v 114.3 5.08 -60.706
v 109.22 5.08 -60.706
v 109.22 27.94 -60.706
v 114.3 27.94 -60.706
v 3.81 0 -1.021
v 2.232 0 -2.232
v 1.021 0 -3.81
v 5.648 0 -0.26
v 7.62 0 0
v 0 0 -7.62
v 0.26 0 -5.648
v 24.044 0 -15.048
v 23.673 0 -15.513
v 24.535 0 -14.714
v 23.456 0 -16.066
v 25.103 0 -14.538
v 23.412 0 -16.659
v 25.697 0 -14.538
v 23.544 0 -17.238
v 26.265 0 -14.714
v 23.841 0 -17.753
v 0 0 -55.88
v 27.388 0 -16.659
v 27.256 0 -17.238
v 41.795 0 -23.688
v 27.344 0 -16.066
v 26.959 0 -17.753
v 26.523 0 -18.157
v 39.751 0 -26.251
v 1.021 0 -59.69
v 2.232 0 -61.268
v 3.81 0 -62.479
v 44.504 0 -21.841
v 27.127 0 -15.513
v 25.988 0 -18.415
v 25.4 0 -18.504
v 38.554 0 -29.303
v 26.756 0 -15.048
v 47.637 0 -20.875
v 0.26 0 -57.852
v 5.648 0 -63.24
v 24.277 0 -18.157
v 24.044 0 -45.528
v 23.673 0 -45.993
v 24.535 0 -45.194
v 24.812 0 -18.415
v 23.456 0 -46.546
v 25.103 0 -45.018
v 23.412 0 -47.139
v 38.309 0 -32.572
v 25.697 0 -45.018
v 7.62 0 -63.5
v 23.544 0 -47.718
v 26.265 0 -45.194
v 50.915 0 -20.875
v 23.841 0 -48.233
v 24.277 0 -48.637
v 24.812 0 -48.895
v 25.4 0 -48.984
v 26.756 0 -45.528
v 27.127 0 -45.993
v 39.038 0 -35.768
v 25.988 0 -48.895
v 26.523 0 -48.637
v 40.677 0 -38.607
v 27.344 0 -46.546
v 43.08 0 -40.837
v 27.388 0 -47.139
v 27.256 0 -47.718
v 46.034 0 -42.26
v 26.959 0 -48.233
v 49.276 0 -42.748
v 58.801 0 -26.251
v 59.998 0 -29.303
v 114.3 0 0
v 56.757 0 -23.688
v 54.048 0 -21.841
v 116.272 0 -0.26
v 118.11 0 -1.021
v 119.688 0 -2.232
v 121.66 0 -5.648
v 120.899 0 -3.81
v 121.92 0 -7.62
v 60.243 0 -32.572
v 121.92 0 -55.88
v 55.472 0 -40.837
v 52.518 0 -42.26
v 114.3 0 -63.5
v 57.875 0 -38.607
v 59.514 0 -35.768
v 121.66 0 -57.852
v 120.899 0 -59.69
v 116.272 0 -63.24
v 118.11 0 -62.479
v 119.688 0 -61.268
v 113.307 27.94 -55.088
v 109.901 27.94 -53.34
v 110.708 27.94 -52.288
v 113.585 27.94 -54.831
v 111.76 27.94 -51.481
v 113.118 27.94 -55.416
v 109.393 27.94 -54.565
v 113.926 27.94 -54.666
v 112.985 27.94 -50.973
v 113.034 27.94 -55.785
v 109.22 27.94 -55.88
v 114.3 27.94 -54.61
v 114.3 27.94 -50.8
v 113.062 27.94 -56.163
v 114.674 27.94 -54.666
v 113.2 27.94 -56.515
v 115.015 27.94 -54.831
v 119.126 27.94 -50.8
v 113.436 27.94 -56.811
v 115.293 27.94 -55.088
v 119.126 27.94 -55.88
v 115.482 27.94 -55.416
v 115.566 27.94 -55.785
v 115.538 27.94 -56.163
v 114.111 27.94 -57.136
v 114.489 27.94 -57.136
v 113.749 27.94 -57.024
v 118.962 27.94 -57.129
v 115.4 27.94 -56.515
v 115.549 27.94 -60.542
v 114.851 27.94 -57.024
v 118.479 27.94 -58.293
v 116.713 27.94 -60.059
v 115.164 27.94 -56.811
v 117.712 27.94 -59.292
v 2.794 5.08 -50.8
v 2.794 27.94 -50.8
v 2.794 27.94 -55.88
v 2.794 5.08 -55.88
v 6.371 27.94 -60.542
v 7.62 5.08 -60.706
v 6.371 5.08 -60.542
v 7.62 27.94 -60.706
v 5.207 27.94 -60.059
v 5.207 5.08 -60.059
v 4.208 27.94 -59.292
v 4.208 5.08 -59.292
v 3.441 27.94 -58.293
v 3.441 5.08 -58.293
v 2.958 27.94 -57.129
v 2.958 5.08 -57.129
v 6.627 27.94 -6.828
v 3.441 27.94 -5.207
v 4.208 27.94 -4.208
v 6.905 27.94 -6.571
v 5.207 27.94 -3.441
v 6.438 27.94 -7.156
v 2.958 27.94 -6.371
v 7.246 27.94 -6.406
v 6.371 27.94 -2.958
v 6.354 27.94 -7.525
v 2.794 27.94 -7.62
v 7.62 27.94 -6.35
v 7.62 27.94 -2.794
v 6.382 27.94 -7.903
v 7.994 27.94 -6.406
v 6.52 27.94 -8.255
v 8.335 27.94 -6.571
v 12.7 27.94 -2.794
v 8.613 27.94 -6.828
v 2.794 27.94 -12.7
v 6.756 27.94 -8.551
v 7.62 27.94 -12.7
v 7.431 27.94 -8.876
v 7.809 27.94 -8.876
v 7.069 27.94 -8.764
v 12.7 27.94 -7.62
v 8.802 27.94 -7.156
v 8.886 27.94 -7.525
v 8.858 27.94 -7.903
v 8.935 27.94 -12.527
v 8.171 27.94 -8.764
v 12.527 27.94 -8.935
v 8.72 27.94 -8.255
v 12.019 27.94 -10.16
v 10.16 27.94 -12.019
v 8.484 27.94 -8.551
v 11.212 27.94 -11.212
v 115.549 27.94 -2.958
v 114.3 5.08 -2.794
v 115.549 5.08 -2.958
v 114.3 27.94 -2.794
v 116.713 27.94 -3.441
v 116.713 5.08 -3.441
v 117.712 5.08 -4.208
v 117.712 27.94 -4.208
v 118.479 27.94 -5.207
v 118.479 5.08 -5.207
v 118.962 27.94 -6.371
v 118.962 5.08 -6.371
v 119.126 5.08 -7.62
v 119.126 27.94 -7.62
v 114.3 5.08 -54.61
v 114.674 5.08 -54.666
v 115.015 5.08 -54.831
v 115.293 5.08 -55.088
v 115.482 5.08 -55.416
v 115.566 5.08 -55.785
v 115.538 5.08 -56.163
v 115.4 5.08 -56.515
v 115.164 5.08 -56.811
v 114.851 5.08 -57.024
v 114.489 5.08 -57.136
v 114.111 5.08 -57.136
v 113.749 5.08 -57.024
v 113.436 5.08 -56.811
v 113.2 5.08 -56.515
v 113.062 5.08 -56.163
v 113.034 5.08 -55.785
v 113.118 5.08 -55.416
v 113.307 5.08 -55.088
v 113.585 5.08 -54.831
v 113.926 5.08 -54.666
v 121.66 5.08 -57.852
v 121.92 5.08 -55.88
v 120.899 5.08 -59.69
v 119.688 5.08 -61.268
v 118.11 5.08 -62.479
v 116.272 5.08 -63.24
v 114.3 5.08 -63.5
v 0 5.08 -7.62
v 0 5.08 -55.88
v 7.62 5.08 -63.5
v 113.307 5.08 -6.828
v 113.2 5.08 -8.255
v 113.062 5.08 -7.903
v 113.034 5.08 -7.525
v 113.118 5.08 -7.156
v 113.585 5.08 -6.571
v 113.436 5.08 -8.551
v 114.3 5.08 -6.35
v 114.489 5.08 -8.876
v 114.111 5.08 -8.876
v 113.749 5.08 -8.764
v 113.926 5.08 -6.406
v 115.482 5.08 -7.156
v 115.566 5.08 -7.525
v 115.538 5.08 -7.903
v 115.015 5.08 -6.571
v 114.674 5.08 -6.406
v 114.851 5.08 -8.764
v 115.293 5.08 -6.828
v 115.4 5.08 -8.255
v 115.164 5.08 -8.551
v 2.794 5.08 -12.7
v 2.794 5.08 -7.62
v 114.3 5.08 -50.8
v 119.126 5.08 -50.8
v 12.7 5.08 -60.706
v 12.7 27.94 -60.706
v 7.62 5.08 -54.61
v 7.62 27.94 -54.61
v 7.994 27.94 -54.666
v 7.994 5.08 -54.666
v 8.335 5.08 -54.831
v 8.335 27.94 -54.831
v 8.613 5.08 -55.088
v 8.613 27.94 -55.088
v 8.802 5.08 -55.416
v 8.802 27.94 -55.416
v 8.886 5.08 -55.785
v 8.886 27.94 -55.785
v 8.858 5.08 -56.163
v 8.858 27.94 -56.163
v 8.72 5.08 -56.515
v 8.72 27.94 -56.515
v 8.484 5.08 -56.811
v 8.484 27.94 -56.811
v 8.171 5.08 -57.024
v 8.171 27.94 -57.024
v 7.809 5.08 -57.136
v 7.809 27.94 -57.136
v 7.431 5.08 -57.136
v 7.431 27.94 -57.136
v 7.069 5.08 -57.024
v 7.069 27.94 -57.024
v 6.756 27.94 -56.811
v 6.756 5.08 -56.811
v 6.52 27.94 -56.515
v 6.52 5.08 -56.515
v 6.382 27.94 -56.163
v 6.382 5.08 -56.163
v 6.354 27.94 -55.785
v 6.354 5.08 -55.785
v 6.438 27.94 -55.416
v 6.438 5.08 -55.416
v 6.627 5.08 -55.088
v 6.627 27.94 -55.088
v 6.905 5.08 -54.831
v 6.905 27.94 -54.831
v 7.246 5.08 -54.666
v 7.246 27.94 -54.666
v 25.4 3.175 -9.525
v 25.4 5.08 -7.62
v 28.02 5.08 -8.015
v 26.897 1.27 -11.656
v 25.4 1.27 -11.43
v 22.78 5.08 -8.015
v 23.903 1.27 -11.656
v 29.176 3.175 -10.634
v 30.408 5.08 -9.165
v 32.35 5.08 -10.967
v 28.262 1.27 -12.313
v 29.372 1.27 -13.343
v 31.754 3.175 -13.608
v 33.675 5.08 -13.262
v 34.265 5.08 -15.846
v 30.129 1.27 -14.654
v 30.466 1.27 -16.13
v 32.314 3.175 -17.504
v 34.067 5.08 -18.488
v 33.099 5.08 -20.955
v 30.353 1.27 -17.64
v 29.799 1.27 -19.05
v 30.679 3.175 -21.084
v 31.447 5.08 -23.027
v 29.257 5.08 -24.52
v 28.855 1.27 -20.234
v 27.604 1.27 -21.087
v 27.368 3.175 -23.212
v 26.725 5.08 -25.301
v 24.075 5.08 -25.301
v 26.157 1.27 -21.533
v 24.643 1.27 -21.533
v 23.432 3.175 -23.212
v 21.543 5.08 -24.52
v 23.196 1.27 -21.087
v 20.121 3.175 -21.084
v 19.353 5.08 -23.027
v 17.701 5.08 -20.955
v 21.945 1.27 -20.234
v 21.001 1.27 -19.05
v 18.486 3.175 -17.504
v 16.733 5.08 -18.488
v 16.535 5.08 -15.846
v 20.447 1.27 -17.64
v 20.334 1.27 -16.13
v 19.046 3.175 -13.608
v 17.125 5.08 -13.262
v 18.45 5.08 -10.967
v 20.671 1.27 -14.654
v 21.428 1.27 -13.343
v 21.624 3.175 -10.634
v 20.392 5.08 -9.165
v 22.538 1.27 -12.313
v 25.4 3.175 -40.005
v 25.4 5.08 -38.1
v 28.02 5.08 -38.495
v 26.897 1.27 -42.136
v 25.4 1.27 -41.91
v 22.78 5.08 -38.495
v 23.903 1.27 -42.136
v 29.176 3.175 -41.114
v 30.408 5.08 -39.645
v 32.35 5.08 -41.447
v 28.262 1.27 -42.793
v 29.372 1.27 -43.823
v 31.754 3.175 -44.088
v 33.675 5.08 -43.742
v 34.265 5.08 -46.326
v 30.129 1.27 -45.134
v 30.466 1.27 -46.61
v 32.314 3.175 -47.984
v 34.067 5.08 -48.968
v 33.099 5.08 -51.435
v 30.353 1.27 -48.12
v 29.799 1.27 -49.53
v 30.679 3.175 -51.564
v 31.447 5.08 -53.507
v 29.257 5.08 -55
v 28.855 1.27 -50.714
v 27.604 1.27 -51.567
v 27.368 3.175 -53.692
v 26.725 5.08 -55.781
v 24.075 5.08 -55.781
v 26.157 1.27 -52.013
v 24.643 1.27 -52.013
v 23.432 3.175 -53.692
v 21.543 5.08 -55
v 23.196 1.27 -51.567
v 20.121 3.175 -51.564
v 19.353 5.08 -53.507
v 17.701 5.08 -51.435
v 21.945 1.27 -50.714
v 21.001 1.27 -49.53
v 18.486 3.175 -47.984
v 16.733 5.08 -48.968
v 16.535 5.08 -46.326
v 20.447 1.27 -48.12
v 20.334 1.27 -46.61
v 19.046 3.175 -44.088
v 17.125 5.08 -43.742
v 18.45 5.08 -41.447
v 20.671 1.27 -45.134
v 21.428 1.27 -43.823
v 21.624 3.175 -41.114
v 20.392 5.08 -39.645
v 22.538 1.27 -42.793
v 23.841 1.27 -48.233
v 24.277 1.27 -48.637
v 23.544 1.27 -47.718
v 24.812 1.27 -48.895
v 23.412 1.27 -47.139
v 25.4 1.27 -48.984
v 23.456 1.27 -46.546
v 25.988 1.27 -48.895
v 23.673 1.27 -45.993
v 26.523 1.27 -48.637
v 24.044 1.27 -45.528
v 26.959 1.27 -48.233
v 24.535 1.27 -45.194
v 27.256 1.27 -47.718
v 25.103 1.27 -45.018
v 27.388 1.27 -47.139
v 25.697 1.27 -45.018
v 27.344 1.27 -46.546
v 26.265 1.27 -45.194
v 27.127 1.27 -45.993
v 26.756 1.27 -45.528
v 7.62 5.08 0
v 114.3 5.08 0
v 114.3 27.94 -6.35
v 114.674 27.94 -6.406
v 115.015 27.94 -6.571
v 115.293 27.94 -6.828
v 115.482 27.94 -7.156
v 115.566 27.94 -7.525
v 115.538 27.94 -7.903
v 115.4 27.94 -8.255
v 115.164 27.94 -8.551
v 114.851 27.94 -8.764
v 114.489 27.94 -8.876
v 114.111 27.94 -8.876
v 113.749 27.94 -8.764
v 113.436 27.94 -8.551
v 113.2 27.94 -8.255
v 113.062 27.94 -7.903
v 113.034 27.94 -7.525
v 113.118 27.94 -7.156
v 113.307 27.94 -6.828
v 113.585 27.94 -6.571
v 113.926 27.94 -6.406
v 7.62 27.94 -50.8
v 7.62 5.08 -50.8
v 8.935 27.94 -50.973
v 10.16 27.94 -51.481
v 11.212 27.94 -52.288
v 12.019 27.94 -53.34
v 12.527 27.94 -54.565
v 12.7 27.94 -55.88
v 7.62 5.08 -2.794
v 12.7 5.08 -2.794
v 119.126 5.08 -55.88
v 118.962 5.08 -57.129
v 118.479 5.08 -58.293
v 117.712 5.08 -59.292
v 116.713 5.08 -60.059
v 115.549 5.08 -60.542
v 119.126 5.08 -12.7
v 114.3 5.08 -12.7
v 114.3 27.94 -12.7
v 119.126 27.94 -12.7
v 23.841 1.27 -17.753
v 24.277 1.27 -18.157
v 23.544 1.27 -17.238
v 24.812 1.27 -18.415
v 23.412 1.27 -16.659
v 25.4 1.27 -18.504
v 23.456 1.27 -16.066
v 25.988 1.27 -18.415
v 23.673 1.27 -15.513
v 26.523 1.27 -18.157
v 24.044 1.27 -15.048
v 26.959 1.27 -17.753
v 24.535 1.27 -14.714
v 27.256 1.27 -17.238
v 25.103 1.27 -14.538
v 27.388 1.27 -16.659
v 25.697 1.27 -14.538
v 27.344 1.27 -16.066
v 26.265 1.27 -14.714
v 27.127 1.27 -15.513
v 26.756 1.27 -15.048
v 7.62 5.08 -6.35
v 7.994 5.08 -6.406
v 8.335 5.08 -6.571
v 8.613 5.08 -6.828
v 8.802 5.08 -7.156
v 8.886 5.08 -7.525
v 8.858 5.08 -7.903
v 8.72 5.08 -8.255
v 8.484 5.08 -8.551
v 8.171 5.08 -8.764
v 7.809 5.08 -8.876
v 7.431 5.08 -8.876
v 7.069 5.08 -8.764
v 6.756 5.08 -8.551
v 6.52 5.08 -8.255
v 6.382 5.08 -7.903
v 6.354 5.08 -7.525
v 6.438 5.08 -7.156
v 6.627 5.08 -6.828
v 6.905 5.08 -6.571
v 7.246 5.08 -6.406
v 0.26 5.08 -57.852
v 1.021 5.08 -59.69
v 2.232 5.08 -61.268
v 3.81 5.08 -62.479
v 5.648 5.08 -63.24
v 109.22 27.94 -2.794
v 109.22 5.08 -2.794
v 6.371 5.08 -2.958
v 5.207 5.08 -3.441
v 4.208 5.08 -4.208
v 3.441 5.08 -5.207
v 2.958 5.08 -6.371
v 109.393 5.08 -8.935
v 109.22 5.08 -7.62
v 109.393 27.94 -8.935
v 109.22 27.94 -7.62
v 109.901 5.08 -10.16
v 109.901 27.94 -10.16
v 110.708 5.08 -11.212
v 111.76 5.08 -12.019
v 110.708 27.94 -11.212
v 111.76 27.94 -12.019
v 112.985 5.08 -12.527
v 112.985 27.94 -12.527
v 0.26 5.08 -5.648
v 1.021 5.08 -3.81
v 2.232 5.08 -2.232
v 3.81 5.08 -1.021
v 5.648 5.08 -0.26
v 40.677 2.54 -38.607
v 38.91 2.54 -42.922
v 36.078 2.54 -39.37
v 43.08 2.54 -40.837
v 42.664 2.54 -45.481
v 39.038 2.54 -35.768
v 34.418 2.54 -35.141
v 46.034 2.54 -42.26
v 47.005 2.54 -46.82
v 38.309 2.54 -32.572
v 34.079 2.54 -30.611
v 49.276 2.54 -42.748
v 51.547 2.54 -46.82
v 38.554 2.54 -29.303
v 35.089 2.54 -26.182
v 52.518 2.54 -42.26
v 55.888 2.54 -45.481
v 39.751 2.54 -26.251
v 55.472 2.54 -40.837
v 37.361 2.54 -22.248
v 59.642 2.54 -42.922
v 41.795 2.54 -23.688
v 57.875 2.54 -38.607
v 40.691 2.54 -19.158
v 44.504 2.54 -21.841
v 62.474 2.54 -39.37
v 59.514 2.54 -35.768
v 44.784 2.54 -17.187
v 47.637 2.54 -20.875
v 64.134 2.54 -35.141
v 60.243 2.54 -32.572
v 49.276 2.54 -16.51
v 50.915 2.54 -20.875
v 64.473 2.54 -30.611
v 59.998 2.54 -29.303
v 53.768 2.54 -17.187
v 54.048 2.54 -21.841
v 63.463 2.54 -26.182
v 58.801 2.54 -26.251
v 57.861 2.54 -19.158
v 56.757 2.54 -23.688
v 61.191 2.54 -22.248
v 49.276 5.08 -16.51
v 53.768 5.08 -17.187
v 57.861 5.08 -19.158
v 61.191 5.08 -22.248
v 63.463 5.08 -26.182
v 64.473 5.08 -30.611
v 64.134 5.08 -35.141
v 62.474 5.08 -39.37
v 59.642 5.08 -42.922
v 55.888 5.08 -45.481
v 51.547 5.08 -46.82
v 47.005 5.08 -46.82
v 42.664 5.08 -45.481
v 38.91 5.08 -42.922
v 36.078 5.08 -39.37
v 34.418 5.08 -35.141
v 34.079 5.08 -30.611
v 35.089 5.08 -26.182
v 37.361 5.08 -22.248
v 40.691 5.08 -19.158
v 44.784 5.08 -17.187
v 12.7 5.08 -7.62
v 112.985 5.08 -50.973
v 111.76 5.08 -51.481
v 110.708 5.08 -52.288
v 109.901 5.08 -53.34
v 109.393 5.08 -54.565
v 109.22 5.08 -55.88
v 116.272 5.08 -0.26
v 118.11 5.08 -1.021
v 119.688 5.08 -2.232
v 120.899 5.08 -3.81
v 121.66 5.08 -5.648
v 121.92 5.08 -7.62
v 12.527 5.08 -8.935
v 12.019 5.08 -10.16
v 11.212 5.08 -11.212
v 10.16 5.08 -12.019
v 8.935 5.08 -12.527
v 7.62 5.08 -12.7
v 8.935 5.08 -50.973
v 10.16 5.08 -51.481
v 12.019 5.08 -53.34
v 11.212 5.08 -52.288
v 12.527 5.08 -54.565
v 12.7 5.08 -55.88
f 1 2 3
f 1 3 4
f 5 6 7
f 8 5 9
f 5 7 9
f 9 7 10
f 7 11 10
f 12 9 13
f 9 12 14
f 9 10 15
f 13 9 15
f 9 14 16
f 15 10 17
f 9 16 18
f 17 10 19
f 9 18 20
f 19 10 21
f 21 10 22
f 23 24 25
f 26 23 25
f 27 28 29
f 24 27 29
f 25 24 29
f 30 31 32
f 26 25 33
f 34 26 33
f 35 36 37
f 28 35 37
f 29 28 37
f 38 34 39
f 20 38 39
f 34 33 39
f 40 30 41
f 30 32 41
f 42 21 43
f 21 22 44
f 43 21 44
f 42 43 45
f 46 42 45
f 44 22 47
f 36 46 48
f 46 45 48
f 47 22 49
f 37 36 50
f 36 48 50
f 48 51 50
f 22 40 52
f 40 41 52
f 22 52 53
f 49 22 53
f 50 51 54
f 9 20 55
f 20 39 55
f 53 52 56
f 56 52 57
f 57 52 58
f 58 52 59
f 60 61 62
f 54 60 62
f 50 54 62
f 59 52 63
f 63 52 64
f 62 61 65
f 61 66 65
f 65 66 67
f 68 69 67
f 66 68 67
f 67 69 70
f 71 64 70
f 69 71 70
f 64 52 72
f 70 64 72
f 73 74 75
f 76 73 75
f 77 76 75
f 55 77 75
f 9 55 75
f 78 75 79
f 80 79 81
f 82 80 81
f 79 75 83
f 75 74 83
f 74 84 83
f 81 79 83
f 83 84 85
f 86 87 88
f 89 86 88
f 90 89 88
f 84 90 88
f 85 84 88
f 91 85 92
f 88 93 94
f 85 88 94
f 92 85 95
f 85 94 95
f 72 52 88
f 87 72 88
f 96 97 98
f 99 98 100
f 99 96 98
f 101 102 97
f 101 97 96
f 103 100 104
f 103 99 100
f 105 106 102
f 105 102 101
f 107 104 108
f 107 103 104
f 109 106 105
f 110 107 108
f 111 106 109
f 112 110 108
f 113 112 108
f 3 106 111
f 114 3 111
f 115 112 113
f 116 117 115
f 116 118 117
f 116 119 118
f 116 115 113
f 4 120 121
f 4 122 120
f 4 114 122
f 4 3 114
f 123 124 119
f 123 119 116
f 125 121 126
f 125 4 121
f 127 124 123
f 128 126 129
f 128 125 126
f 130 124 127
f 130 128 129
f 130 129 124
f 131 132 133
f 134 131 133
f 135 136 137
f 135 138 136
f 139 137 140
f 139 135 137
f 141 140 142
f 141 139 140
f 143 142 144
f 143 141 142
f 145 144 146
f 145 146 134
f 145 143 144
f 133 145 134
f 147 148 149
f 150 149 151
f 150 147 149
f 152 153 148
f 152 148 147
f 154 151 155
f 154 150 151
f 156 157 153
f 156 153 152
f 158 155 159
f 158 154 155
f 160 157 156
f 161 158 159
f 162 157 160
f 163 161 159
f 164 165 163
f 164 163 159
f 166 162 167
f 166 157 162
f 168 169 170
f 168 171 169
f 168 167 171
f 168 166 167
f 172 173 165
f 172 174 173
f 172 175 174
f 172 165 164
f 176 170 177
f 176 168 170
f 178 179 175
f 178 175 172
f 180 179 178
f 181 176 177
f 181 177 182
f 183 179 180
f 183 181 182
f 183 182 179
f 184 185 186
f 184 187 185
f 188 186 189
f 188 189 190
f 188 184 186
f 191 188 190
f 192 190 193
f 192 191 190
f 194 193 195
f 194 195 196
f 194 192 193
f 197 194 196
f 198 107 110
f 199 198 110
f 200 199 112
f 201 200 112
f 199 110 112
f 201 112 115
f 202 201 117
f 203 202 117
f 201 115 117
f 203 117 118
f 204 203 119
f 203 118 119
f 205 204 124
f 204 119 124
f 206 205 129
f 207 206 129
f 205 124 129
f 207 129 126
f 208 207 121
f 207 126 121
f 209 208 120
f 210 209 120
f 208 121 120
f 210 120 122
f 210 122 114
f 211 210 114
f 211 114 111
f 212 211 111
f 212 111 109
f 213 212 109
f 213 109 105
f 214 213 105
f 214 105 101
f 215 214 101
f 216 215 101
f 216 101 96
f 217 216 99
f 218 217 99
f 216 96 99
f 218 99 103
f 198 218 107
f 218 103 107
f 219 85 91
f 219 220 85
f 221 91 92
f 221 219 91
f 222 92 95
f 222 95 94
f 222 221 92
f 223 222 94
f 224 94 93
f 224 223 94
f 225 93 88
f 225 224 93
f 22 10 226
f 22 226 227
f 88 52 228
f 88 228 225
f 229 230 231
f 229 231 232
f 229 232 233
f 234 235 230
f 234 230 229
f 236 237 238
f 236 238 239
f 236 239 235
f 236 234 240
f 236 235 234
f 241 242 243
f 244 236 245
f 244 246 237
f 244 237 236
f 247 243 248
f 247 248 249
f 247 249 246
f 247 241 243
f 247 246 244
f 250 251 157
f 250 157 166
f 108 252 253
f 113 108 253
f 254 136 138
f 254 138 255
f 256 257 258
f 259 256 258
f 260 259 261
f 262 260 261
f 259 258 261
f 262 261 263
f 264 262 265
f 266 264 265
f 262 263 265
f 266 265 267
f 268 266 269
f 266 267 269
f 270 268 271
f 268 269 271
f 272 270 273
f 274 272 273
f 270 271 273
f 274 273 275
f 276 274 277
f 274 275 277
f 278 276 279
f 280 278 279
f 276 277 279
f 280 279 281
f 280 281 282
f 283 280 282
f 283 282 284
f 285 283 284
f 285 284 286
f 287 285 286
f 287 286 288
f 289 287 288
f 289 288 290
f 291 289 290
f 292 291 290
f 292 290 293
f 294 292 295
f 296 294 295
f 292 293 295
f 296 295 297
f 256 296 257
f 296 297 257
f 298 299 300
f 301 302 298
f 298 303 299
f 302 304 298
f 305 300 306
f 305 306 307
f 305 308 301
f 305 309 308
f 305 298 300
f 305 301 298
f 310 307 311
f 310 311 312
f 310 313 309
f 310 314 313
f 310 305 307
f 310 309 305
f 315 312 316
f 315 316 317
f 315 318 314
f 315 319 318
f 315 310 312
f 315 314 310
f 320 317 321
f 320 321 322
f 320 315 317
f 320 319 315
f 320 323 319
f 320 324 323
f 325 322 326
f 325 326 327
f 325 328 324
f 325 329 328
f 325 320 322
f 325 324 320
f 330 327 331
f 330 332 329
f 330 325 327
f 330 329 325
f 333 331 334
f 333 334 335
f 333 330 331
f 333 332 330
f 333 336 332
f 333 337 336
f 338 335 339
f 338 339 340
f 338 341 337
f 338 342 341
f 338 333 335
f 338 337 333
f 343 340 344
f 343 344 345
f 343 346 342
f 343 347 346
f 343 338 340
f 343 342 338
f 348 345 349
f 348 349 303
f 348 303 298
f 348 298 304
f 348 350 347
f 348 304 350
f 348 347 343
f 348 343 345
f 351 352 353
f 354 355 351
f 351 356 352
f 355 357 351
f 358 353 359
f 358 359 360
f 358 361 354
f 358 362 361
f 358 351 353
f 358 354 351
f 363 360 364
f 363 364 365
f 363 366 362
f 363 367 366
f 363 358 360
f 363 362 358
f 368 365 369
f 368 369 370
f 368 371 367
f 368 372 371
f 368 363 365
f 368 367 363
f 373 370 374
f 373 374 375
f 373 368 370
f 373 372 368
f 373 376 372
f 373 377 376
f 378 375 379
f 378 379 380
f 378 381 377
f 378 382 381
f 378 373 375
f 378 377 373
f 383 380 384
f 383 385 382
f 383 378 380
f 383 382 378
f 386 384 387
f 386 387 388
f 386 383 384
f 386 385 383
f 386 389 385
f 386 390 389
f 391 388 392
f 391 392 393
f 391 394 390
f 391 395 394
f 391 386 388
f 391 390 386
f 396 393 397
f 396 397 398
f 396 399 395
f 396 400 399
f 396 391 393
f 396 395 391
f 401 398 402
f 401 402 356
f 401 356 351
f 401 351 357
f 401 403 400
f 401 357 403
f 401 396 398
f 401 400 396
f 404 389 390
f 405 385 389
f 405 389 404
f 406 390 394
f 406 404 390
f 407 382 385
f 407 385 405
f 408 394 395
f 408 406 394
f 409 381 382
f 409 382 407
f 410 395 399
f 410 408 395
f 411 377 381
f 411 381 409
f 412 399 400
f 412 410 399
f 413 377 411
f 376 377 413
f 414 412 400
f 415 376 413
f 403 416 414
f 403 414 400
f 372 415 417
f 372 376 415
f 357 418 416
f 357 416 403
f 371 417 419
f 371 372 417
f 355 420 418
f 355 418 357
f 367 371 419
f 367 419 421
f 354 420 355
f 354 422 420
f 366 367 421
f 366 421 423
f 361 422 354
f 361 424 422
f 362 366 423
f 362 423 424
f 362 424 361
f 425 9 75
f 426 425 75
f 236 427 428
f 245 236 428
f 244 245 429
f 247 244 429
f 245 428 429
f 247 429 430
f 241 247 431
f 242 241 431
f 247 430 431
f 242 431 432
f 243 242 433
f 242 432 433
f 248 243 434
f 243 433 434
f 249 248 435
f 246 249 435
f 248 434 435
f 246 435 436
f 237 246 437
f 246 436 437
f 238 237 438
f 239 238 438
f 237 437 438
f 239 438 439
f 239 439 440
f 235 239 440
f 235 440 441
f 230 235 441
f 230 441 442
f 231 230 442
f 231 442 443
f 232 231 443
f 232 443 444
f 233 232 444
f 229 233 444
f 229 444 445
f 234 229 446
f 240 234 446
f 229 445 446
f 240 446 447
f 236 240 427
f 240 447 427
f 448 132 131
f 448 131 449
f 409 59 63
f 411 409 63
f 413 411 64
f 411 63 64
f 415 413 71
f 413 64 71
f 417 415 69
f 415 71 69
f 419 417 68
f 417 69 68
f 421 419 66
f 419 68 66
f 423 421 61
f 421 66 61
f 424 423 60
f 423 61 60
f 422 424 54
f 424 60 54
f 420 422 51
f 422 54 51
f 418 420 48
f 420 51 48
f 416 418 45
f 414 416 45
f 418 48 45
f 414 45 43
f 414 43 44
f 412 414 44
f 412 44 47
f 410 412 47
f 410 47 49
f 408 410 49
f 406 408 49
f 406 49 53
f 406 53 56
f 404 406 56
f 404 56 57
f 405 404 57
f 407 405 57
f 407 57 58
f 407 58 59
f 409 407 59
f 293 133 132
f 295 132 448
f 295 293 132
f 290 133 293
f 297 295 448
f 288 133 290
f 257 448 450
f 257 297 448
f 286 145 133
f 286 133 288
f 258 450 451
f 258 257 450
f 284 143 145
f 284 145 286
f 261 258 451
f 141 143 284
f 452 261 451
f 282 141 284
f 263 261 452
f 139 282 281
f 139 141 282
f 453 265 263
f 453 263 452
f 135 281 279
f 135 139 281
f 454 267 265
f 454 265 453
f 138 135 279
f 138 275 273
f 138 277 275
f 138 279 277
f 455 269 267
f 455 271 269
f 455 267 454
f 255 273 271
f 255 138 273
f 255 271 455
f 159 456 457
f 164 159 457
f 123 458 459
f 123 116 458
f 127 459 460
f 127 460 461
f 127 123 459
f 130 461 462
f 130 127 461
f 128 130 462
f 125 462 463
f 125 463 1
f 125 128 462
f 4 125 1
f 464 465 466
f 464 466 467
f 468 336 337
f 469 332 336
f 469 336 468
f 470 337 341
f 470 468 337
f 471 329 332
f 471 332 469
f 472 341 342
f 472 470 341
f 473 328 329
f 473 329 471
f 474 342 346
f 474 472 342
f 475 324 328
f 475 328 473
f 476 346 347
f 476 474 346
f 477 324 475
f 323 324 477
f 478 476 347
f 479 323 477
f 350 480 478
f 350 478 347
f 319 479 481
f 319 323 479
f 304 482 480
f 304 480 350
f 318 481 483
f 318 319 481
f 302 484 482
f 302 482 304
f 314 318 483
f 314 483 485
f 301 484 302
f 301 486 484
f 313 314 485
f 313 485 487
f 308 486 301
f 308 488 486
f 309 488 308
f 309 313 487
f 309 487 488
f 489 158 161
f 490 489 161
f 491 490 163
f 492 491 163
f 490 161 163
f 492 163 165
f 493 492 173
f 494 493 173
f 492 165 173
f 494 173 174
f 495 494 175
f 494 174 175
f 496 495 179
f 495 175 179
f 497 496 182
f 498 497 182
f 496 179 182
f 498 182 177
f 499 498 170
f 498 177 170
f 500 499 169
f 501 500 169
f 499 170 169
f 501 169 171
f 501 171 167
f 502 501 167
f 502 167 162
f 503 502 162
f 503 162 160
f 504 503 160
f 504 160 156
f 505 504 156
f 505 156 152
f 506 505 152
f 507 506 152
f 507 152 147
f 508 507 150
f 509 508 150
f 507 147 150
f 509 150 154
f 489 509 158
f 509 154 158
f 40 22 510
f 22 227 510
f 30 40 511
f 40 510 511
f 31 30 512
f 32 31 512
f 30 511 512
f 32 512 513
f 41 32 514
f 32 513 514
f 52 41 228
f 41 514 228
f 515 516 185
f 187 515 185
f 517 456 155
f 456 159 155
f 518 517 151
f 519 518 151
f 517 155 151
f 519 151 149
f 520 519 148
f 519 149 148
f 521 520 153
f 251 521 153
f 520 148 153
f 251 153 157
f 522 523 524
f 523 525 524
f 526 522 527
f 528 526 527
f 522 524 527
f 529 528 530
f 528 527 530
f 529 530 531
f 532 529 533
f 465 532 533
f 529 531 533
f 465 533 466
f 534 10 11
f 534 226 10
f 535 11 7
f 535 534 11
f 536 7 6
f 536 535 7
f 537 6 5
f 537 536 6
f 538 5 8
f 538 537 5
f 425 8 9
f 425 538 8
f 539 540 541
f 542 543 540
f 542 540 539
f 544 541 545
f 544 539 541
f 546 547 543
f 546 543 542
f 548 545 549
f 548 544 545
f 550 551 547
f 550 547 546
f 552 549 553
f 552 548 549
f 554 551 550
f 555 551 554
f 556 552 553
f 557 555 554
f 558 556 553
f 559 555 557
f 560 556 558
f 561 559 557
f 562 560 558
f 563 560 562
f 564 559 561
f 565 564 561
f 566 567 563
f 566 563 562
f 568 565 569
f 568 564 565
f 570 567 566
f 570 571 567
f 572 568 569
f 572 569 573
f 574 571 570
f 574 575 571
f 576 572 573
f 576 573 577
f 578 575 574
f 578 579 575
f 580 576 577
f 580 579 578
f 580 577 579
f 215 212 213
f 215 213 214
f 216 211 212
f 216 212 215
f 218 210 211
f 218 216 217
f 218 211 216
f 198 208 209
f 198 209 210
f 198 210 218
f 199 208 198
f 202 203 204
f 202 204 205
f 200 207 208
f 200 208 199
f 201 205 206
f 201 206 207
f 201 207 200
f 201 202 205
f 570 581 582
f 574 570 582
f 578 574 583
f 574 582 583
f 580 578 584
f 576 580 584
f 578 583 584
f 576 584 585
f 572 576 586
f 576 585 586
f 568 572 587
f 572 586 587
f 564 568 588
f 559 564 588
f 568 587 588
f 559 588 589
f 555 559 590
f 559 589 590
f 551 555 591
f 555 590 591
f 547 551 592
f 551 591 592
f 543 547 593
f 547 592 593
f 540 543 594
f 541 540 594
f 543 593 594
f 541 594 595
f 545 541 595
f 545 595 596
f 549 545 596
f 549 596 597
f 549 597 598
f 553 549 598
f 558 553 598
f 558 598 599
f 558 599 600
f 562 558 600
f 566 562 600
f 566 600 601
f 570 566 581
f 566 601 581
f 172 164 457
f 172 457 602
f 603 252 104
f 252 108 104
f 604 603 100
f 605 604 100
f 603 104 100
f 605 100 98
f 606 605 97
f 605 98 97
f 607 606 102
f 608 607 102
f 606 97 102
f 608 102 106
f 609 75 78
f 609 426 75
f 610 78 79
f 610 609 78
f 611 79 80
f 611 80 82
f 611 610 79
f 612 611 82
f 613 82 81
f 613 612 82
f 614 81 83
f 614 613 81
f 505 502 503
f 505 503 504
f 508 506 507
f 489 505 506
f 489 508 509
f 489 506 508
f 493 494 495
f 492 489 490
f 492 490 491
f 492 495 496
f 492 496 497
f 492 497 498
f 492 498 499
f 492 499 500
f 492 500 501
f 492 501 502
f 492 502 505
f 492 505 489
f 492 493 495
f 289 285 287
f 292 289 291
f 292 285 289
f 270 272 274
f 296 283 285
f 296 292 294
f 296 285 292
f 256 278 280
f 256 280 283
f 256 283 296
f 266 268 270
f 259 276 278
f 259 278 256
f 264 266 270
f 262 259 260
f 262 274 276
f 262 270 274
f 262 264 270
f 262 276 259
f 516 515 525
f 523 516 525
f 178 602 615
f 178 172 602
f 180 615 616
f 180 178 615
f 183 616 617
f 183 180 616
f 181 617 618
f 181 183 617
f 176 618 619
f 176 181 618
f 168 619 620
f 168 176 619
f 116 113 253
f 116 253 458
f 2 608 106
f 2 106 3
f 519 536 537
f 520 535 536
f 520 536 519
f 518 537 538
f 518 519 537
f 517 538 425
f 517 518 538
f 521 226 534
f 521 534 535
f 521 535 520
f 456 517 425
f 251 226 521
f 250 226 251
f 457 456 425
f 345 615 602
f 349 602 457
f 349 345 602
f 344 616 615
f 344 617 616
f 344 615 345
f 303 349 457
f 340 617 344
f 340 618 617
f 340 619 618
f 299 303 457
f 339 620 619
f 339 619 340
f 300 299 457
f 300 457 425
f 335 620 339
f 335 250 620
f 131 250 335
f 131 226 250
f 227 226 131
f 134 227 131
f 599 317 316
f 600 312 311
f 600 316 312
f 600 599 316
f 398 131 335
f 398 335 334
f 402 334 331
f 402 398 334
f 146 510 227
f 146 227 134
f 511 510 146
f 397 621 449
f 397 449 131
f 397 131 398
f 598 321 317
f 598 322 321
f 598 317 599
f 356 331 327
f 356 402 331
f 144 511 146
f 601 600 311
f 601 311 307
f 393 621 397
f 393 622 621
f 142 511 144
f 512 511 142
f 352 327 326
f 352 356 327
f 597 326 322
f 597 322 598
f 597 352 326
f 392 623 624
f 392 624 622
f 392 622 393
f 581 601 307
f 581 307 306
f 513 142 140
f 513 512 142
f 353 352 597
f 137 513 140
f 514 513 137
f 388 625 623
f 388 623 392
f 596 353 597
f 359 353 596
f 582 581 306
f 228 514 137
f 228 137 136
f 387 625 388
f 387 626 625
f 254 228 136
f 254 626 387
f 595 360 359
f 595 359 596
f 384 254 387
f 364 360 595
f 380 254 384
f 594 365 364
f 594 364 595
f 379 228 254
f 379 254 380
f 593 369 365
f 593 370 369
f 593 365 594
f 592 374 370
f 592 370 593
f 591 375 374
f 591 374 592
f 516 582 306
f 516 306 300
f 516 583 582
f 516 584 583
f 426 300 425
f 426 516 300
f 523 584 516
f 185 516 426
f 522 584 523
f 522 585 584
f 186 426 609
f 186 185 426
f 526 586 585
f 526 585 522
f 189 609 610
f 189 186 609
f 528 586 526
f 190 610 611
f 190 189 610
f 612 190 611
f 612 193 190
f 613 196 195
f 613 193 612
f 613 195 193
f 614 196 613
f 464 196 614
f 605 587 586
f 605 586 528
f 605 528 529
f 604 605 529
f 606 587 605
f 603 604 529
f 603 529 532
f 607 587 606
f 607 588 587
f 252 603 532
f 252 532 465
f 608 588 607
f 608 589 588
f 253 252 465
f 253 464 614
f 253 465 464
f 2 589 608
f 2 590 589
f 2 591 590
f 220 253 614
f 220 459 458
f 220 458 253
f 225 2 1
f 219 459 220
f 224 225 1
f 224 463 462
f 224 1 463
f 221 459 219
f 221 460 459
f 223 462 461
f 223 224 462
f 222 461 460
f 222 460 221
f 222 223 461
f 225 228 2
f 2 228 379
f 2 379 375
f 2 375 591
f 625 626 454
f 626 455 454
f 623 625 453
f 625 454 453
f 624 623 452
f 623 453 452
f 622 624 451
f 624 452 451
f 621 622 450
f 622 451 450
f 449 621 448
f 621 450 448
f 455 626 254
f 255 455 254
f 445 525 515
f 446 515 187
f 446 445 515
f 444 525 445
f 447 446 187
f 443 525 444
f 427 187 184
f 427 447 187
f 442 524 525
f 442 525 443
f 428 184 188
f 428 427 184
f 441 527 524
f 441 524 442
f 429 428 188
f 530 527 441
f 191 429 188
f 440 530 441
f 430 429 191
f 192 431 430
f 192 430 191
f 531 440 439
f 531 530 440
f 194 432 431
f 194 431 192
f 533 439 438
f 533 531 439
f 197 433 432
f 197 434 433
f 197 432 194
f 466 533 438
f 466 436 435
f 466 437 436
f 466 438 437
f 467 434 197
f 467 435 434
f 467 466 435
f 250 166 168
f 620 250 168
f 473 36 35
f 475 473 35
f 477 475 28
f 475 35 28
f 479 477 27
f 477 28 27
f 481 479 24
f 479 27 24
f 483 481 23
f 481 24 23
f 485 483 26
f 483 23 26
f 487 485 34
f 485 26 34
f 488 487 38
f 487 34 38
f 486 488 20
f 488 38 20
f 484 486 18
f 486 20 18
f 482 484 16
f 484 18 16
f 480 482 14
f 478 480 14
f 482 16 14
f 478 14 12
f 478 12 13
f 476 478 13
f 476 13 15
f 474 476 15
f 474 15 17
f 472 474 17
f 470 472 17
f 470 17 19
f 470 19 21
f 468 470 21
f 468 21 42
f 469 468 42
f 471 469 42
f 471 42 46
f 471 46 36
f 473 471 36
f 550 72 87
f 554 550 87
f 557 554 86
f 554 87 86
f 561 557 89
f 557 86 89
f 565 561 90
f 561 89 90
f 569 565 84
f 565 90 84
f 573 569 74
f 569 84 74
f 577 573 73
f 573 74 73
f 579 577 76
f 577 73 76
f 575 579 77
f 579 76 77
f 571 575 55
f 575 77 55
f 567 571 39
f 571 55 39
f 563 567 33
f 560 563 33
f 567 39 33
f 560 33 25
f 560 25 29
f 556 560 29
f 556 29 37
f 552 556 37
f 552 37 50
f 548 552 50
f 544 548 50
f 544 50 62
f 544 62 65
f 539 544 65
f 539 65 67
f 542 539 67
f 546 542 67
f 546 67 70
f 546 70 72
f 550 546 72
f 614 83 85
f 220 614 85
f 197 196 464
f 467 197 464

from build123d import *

# Parameters (mm, degrees)
SKETCH1_W           = 121.92
SKETCH1_H           = 63.5
BOSS_EXTRUDE1_DEPTH = 5.08
FILLET1_R           = 7.62
SKETCH2_W           = 9.906
SKETCH2_H           = 9.906
BOSS_EXTRUDE2_DEPTH = 22.86
FILLET2_R           = 4.826
FILLET3_R           = 5.08
SKETCH3_R           = 1.27
CUT_EXTRUDE1_DEPTH  = 22.86
CUT_EXTRUDE2_REACH  = 142.276
SKETCH5_R           = 10.9982
CUT_EXTRUDE3_REACH  = 142.276
SKETCH6_R           = 1.9939
SKETCH7_R           = 5.08
CUT_EXTRUDE4_DEPTH  = 3.81
CHAMFER1_SIZE       = 3.81
SKETCH8_R           = 15.24
CUT_EXTRUDE5_DEPTH  = 2.54


with BuildPart() as part:
    # Sketch1 → Boss-Extrude1 (new body)
    with BuildSketch(Plane(origin=(0, 0, 0), x_dir=(1, 0, 0), z_dir=(0, 1, 0))):
        with Locations((60.96, 31.75)):
            Rectangle(SKETCH1_W, SKETCH1_H)
    extrude(amount=BOSS_EXTRUDE1_DEPTH)

    # Fillet1
    fillet1_edges = [part.edges().sort_by_distance(p)[0] for p in [
        (0, 2.54, -63.5),
        (121.92, 2.54, -63.5),
        (121.92, 2.54, 0),
        (0, 2.54, 0),
    ]]
    fillet(fillet1_edges, radius=FILLET1_R)

    # Sketch2 → Boss-Extrude2 (add)
    with BuildSketch(Plane(origin=(0, 5.08, 0), x_dir=(1, 0, 0), z_dir=(0, 1, 0))):
        with Locations((7.747, 55.753)):
            Rectangle(SKETCH2_W, SKETCH2_H)
        with Locations((114.173, 55.753)):
            Rectangle(SKETCH2_W, SKETCH2_H)
        with Locations((114.173, 7.747)):
            Rectangle(SKETCH2_W, SKETCH2_H)
        with Locations((7.747, 7.747)):
            Rectangle(SKETCH2_W, SKETCH2_H)
    extrude(amount=BOSS_EXTRUDE2_DEPTH)

    # Fillet2
    fillet2_edges = [part.edges().sort_by_distance(p)[0] for p in [
        (2.794, 16.51, -60.706),
        (119.126, 16.51, -60.706),
        (119.126, 16.51, -2.794),
        (2.794, 16.51, -2.794),
    ]]
    fillet(fillet2_edges, radius=FILLET2_R)

    # Fillet3
    fillet3_edges = [part.edges().sort_by_distance(p)[0] for p in [
        (12.7, 16.51, -50.8),
        (109.22, 16.51, -50.8),
        (109.22, 16.51, -12.7),
        (12.7, 16.51, -12.7),
    ]]
    fillet(fillet3_edges, radius=FILLET3_R)

    # Sketch3 → Cut-Extrude1 (cut)
    with BuildSketch(Plane(origin=(0, 27.94, 0), x_dir=(1, 0, 0), z_dir=(0, 1, 0))):
        with Locations(Location((7.62, 55.88, 0), (0, 0, 270))):
            Circle(SKETCH3_R)
        with Locations(Location((114.3, 55.88, 0), (0, 0, 270))):
            Circle(SKETCH3_R)
        with Locations(Location((114.3, 7.62, 0), (0, 0, 270))):
            Circle(SKETCH3_R)
        with Locations(Location((7.62, 7.62, 0), (0, 0, 270))):
            Circle(SKETCH3_R)
    extrude(amount=-CUT_EXTRUDE1_DEPTH, mode=Mode.SUBTRACT)

    # Sketch5 → Cut-Extrude2 (cut, up to next)
    with BuildSketch(Plane.XZ, mode=Mode.PRIVATE) as cut_extrude2_sk1:
        with Locations(Location((49.276, -31.75, 0), (0, 0, 270))):
            Circle(SKETCH5_R)
    cut_extrude2_tool1 = extrude(cut_extrude2_sk1.sketch, amount=-CUT_EXTRUDE2_REACH, mode=Mode.PRIVATE) & part.part
    add(cut_extrude2_tool1.solids().sort_by_distance((49.276, 0, -31.75))[0], mode=Mode.SUBTRACT)

    # Sketch6 → Cut-Extrude3 (cut, up to next)
    with BuildSketch(Plane.XZ, mode=Mode.PRIVATE) as cut_extrude3_sk1:
        with Locations(Location((25.4, -16.51, 0), (0, 0, 270))):
            Circle(SKETCH6_R)
    cut_extrude3_tool1 = extrude(cut_extrude3_sk1.sketch, amount=-CUT_EXTRUDE3_REACH, mode=Mode.PRIVATE) & part.part
    # Sketch6 → Cut-Extrude3 (cut, up to next)
    with BuildSketch(Plane.XZ, mode=Mode.PRIVATE) as cut_extrude3_sk2:
        with Locations(Location((25.4, -46.99, 0), (0, 0, 270))):
            Circle(SKETCH6_R)
    cut_extrude3_tool2 = extrude(cut_extrude3_sk2.sketch, amount=-CUT_EXTRUDE3_REACH, mode=Mode.PRIVATE) & part.part
    add(cut_extrude3_tool1.solids().sort_by_distance((25.4, 0, -16.51))[0], mode=Mode.SUBTRACT)
    add(cut_extrude3_tool2.solids().sort_by_distance((25.4, 0, -46.99))[0], mode=Mode.SUBTRACT)

    # Sketch7 → Cut-Extrude4 (cut)
    with BuildSketch(Plane(origin=(0, 5.08, 0), x_dir=(1, 0, 0), z_dir=(0, 1, 0))):
        with Locations(Location((25.4, 46.99, 0), (0, 0, 270))):
            Circle(SKETCH7_R)
        with Locations(Location((25.4, 16.51, 0), (0, 0, 270))):
            Circle(SKETCH7_R)
    extrude(amount=-CUT_EXTRUDE4_DEPTH, mode=Mode.SUBTRACT)

    # Chamfer1
    chamfer1_edges = [part.edges().sort_by_distance(p)[0] for p in [
        (25.4, 5.08, -52.07),
        (25.4, 5.08, -21.59),
    ]]
    chamfer(chamfer1_edges, length=CHAMFER1_SIZE - 0.0001)  # a hair under: the kernel refuses the full size

    # Sketch8 → Cut-Extrude5 (cut)
    with BuildSketch(Plane(origin=(0, 5.08, 0), x_dir=(1, 0, 0), z_dir=(0, 1, 0))):
        with Locations(Location((49.276, 31.75, 0), (0, 0, 270))):
            Circle(SKETCH8_R)
    extrude(amount=-CUT_EXTRUDE5_DEPTH, mode=Mode.SUBTRACT)


solid = part.part
